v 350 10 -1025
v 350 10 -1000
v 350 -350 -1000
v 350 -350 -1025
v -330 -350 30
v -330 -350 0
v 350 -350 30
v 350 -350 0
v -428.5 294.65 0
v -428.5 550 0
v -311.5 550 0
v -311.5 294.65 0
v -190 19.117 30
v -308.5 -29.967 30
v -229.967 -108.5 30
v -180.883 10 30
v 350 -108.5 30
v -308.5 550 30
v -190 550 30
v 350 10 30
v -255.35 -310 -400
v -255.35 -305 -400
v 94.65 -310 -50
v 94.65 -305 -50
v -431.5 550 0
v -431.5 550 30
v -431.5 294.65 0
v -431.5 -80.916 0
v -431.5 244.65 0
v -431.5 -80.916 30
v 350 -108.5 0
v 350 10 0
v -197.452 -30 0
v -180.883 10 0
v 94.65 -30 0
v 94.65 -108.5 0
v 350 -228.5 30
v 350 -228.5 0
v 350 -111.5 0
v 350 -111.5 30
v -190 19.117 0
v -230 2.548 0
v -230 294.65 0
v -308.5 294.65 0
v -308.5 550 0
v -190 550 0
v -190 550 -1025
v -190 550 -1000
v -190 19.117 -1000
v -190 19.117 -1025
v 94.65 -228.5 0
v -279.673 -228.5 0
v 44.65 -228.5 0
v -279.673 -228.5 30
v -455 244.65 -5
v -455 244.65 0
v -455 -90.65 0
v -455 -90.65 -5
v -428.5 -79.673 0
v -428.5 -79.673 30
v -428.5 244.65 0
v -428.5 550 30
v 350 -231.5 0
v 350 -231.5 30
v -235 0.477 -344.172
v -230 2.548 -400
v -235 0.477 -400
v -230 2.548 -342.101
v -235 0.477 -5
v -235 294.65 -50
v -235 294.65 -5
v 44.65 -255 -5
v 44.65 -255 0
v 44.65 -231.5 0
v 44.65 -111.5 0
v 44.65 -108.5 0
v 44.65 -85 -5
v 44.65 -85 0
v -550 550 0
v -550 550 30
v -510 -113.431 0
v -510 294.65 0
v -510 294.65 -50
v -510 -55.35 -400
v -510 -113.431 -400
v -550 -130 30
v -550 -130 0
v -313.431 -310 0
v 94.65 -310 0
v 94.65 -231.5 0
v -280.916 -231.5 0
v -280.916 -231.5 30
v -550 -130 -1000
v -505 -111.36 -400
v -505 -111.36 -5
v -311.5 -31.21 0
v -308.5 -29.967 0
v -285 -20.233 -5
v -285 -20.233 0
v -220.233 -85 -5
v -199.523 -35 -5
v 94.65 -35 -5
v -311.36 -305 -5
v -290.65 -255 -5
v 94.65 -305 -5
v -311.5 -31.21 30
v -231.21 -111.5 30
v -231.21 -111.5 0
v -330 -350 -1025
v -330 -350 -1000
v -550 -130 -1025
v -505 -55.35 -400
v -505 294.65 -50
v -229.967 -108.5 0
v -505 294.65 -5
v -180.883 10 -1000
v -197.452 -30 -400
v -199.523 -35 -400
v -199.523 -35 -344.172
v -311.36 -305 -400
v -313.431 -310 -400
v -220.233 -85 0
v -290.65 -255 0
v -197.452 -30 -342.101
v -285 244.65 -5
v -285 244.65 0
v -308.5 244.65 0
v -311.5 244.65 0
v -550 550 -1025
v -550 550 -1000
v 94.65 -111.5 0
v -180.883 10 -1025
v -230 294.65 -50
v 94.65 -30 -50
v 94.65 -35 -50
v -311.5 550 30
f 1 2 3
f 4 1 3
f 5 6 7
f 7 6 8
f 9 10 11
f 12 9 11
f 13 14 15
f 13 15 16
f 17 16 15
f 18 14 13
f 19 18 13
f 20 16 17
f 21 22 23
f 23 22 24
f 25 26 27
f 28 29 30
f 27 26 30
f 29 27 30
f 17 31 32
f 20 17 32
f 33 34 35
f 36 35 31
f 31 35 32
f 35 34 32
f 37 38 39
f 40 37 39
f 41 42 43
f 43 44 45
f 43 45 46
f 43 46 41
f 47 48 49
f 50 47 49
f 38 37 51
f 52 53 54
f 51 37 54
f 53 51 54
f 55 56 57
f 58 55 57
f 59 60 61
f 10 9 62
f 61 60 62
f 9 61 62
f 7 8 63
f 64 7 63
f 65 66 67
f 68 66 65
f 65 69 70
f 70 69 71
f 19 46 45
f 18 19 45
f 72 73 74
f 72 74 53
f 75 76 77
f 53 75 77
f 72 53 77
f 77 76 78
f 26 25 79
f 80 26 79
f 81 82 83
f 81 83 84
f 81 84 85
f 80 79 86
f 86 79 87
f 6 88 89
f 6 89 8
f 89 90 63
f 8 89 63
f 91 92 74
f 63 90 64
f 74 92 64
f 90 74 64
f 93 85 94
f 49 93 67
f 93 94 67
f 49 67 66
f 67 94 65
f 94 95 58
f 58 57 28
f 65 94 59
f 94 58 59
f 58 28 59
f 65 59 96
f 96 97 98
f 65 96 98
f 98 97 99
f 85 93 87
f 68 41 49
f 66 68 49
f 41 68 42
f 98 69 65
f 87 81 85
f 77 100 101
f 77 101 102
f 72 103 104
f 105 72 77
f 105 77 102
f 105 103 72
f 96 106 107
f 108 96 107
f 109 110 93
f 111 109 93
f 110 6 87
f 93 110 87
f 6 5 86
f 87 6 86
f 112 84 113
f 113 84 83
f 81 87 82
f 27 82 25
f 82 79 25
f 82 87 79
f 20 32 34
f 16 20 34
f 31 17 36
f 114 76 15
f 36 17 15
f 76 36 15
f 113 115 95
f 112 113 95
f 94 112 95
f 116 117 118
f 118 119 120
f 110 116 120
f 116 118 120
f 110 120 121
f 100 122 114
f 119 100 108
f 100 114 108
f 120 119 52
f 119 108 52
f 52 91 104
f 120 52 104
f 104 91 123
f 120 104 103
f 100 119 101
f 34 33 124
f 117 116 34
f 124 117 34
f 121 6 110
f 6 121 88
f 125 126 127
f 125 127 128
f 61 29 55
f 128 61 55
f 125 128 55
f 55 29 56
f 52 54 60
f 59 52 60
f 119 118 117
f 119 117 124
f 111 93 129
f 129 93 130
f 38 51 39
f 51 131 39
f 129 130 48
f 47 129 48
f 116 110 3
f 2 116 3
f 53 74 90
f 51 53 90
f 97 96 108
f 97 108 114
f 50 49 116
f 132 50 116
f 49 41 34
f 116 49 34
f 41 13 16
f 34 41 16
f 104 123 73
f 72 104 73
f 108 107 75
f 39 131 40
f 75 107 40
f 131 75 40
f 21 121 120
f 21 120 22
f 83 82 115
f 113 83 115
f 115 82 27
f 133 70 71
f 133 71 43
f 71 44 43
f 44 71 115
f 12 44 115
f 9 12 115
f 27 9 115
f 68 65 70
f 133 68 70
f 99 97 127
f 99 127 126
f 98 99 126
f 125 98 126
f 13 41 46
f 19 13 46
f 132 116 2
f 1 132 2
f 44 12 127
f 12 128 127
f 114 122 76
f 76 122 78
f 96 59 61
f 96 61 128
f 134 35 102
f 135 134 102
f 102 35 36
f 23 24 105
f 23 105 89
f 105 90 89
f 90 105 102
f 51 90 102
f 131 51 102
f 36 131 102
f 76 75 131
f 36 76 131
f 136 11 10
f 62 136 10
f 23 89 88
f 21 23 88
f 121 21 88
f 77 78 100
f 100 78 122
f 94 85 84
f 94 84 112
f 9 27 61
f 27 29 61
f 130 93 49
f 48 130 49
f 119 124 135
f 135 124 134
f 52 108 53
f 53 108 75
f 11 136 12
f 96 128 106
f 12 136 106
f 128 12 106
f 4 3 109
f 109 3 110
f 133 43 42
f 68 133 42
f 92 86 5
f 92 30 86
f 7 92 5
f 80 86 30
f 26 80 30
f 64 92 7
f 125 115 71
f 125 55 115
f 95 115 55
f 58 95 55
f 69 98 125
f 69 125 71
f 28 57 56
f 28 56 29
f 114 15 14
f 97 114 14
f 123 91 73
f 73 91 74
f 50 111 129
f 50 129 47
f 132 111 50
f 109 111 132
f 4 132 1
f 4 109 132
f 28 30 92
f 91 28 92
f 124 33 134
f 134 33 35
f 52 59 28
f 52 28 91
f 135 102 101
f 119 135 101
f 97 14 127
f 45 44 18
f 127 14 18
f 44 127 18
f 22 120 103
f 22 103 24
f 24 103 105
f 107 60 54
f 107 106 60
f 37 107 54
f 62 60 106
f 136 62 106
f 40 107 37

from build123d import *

# Parameters (mm, degrees)
F1_DEPTH     = 30
F3_DEPTH     = 1000
F5_DEPTH     = 25
F6_W         = 5
F6_H         = 408.0812203564
F7_DEPTH     = 400
F8_T4_DEPTH  = 1805.1780915761
F8_T10_DEPTH = 1805.1780915761
F8_T16_DEPTH = 1805.1780915761
F8_T22_DEPTH = 1805.1780915761
F8_T28_DEPTH = 1805.1780915761
F8_T34_DEPTH = 1805.1780915761
F8_T40_DEPTH = 1805.1780915761
F8_T46_DEPTH = 1805.1780915761
F8_T52_DEPTH = 1805.1780915761
F8_T58_DEPTH = 1805.1780915761
F8_T64_DEPTH = 1805.1780915761
F8_T70_DEPTH = 1805.1780915761
F12_DEPTH    = 30
F13_DEPTH    = 5


# Not quite as in the source:
# - a fillet or chamfer that OpenCascade refuses, or shapes differently, is made with other operations: its cross-section is extruded or revolved along the edge and cut away or added


with BuildPart() as f1:
    # F0 (on Top) → F1 (new body)
    with BuildSketch(Plane.XY):
        Polygon((-190, 550), (-550, 550), (-550, -130), (-330, -350), (350, -350), (350, 10), (-180.8831175457, 10), (-190, 19.1168824543), align=None)
    extrude(amount=F1_DEPTH)

    # F2 (on face) → F3 (join)
    with BuildSketch(Plane(origin=(0, 0, 0), x_dir=(1, 0, 0), z_dir=(0, 0, -1))):
        Polygon((-330, 350), (-550, 130), (-190, -19.1168824543), (-180.8831175457, -10), align=None)
    extrude(amount=F3_DEPTH)

    # F4 (on face) → F5 (join)
    with BuildSketch(Plane(origin=(0, 0, -1000), x_dir=(1, 0, 0), z_dir=(0, 0, -1))):
        Polygon((350, 350), (-330, 350), (-550, 130), (-550, -550), (-190, -550), (-190, -19.1168824543), (-180.8831175457, -10), (350, -10), align=None)
    extrude(amount=F5_DEPTH)

    # F6 (on face) → F7 (join)
    with BuildSketch(Plane(origin=(0, 0, 0), x_dir=(1, 0, 0), z_dir=(0, 0, -1))):
        Polygon((-311.3603896932, 305), (94.6497628513, 305), (94.6497628513, 310), (-313.4314575051, 310), align=None)
        with Locations((-507.5, -90.6091526731)):
            Rectangle(F6_W, F6_H)
        Polygon((94.6497628513, 30), (94.6497628513, 35), (-199.5227278525, 35), (-197.4516600406, 30), align=None)
        Polygon((-235, -0.4772721475), (-235, -294.6497628513), (-230, -294.6497628513), (-230, -2.5483399594), align=None)
    extrude(amount=F7_DEPTH)

    # F8: chamfer of 350 on 4 edges, made by hand


with BuildPart() as f8_tool2:
    # F8_s3 → F8_t4 (new body)
    with BuildSketch(Plane.YZ.offset(-1410.0890457881)):
        Polygon((-55.3502371487, -400), (294.6497628513, -50), (294.6497628513, -400), align=None)
    extrude(amount=F8_T4_DEPTH)

    split(bisect_by=Plane(origin=(-34.5836943966, 83.4924240492, 0), x_dir=(0, 0, 1), z_dir=(-0.3826834324, 0.9238795325, 0)), keep=Keep.TOP)

    split(bisect_by=Plane(origin=(-157.9289321881, 65.4163056034, 0), x_dir=(0, 0, 1), z_dir=(-0.9238795325, 0.3826834324, 0)), keep=Keep.TOP)


with BuildPart() as f1_1:
    add(f1.part)

    # F8_t1: cut F8_tool2
    add(f8_tool2.part, mode=Mode.SUBTRACT)


with BuildPart() as f8_tool8:
    # F8_s9 → F8_t10 (new body)
    with BuildSketch(Plane.YZ.offset(-1410.0890457881)):
        Polygon((-55.3502371487, -400), (294.6497628513, -50), (294.6497628513, -400), align=None)
    extrude(amount=F8_T10_DEPTH)

    split(bisect_by=Plane(origin=(-34.5836943966, 83.4924240492, 0), x_dir=(0, 0, 1), z_dir=(-0.3826834324, 0.9238795325, 0)), keep=Keep.TOP)

    split(bisect_by=Plane(origin=(-157.9289321881, 65.4163056034, 0), x_dir=(0, 0, 1), z_dir=(0.9238795325, -0.3826834324, 0)), keep=Keep.TOP)


with BuildPart() as f1_2:
    add(f1_1.part)

    # F8_t7: cut F8_tool8
    add(f8_tool8.part, mode=Mode.SUBTRACT)


with BuildPart() as f8_tool14:
    # F8_s15 → F8_t16 (new body)
    with BuildSketch(Plane.YZ.offset(-1410.0890457881)):
        Polygon((-55.3502371487, -400), (294.6497628513, -50), (294.6497628513, -400), align=None)
    extrude(amount=F8_T16_DEPTH)

    split(bisect_by=Plane(origin=(-34.5836943966, 83.4924240492, 0), x_dir=(0, 0, 1), z_dir=(0.3826834324, -0.9238795325, 0)), keep=Keep.TOP)

    split(bisect_by=Plane(origin=(-157.9289321881, 65.4163056034, 0), x_dir=(0, 0, 1), z_dir=(0.9238795325, -0.3826834324, 0)), keep=Keep.TOP)


with BuildPart() as f1_3:
    add(f1_2.part)

    # F8_t13: cut F8_tool14
    add(f8_tool14.part, mode=Mode.SUBTRACT)


with BuildPart() as f8_tool20:
    # F8_s21 → F8_t22 (new body)
    with BuildSketch(Plane.XZ.offset(-595.0890457881)):
        Polygon((-255.3502371487, -400), (94.6497628513, -50), (94.6497628513, -400), align=None)
    extrude(amount=F8_T22_DEPTH)

    split(bisect_by=Plane(origin=(-34.5836943966, 83.4924240492, 0), x_dir=(0, 0, 1), z_dir=(-0.3826834324, 0.9238795325, 0)), keep=Keep.TOP)

    split(bisect_by=Plane(origin=(-157.9289321881, 65.4163056034, 0), x_dir=(0, 0, 1), z_dir=(-0.9238795325, 0.3826834324, 0)), keep=Keep.TOP)


with BuildPart() as f1_4:
    add(f1_3.part)

    # F8_t19: cut F8_tool20
    add(f8_tool20.part, mode=Mode.SUBTRACT)


with BuildPart() as f8_tool26:
    # F8_s27 → F8_t28 (new body)
    with BuildSketch(Plane.XZ.offset(-595.0890457881)):
        Polygon((-255.3502371487, -400), (94.6497628513, -50), (94.6497628513, -400), align=None)
    extrude(amount=F8_T28_DEPTH)

    split(bisect_by=Plane(origin=(-34.5836943966, 83.4924240492, 0), x_dir=(0, 0, 1), z_dir=(-0.3826834324, 0.9238795325, 0)), keep=Keep.TOP)

    split(bisect_by=Plane(origin=(-157.9289321881, 65.4163056034, 0), x_dir=(0, 0, 1), z_dir=(0.9238795325, -0.3826834324, 0)), keep=Keep.TOP)


with BuildPart() as f1_5:
    add(f1_4.part)

    # F8_t25: cut F8_tool26
    add(f8_tool26.part, mode=Mode.SUBTRACT)


with BuildPart() as f8_tool32:
    # F8_s33 → F8_t34 (new body)
    with BuildSketch(Plane.XZ.offset(-595.0890457881)):
        Polygon((-255.3502371487, -400), (94.6497628513, -50), (94.6497628513, -400), align=None)
    extrude(amount=F8_T34_DEPTH)

    split(bisect_by=Plane(origin=(-34.5836943966, 83.4924240492, 0), x_dir=(0, 0, 1), z_dir=(0.3826834324, -0.9238795325, 0)), keep=Keep.TOP)

    split(bisect_by=Plane(origin=(-157.9289321881, 65.4163056034, 0), x_dir=(0, 0, 1), z_dir=(0.9238795325, -0.3826834324, 0)), keep=Keep.TOP)


with BuildPart() as f1_6:
    add(f1_5.part)

    # F8_t31: cut F8_tool32
    add(f8_tool32.part, mode=Mode.SUBTRACT)


with BuildPart() as f8_tool38:
    # F8_s39 → F8_t40 (new body)
    with BuildSketch(Plane.YZ.offset(-1135.0890457881)):
        Polygon((-55.3502371487, -400), (294.6497628513, -50), (294.6497628513, -400), align=None)
    extrude(amount=F8_T40_DEPTH)

    split(bisect_by=Plane(origin=(-34.5836943966, 83.4924240492, 0), x_dir=(0, 0, 1), z_dir=(-0.3826834324, 0.9238795325, 0)), keep=Keep.TOP)

    split(bisect_by=Plane(origin=(-157.9289321881, 65.4163056034, 0), x_dir=(0, 0, 1), z_dir=(-0.9238795325, 0.3826834324, 0)), keep=Keep.TOP)


with BuildPart() as f1_7:
    add(f1_6.part)

    # F8_t37: cut F8_tool38
    add(f8_tool38.part, mode=Mode.SUBTRACT)


with BuildPart() as f8_tool44:
    # F8_s45 → F8_t46 (new body)
    with BuildSketch(Plane.YZ.offset(-1135.0890457881)):
        Polygon((-55.3502371487, -400), (294.6497628513, -50), (294.6497628513, -400), align=None)
    extrude(amount=F8_T46_DEPTH)

    split(bisect_by=Plane(origin=(-34.5836943966, 83.4924240492, 0), x_dir=(0, 0, 1), z_dir=(-0.3826834324, 0.9238795325, 0)), keep=Keep.TOP)

    split(bisect_by=Plane(origin=(-157.9289321881, 65.4163056034, 0), x_dir=(0, 0, 1), z_dir=(0.9238795325, -0.3826834324, 0)), keep=Keep.TOP)


with BuildPart() as f1_8:
    add(f1_7.part)

    # F8_t43: cut F8_tool44
    add(f8_tool44.part, mode=Mode.SUBTRACT)


with BuildPart() as f8_tool50:
    # F8_s51 → F8_t52 (new body)
    with BuildSketch(Plane.YZ.offset(-1135.0890457881)):
        Polygon((-55.3502371487, -400), (294.6497628513, -50), (294.6497628513, -400), align=None)
    extrude(amount=F8_T52_DEPTH)

    split(bisect_by=Plane(origin=(-34.5836943966, 83.4924240492, 0), x_dir=(0, 0, 1), z_dir=(0.3826834324, -0.9238795325, 0)), keep=Keep.TOP)

    split(bisect_by=Plane(origin=(-157.9289321881, 65.4163056034, 0), x_dir=(0, 0, 1), z_dir=(0.9238795325, -0.3826834324, 0)), keep=Keep.TOP)


with BuildPart() as f1_9:
    add(f1_8.part)

    # F8_t49: cut F8_tool50
    add(f8_tool50.part, mode=Mode.SUBTRACT)


with BuildPart() as f8_tool56:
    # F8_s57 → F8_t58 (new body)
    with BuildSketch(Plane.XZ.offset(-870.0890457881)):
        Polygon((-255.3502371487, -400), (94.6497628513, -50), (94.6497628513, -400), align=None)
    extrude(amount=F8_T58_DEPTH)

    split(bisect_by=Plane(origin=(-34.5836943966, 83.4924240492, 0), x_dir=(0, 0, 1), z_dir=(-0.3826834324, 0.9238795325, 0)), keep=Keep.TOP)

    split(bisect_by=Plane(origin=(-157.9289321881, 65.4163056034, 0), x_dir=(0, 0, 1), z_dir=(-0.9238795325, 0.3826834324, 0)), keep=Keep.TOP)


with BuildPart() as f1_10:
    add(f1_9.part)

    # F8_t55: cut F8_tool56
    add(f8_tool56.part, mode=Mode.SUBTRACT)


with BuildPart() as f8_tool62:
    # F8_s63 → F8_t64 (new body)
    with BuildSketch(Plane.XZ.offset(-870.0890457881)):
        Polygon((-255.3502371487, -400), (94.6497628513, -50), (94.6497628513, -400), align=None)
    extrude(amount=F8_T64_DEPTH)

    split(bisect_by=Plane(origin=(-34.5836943966, 83.4924240492, 0), x_dir=(0, 0, 1), z_dir=(-0.3826834324, 0.9238795325, 0)), keep=Keep.TOP)

    split(bisect_by=Plane(origin=(-157.9289321881, 65.4163056034, 0), x_dir=(0, 0, 1), z_dir=(0.9238795325, -0.3826834324, 0)), keep=Keep.TOP)


with BuildPart() as f1_11:
    add(f1_10.part)

    # F8_t61: cut F8_tool62
    add(f8_tool62.part, mode=Mode.SUBTRACT)


with BuildPart() as f8_tool68:
    # F8_s69 → F8_t70 (new body)
    with BuildSketch(Plane.XZ.offset(-870.0890457881)):
        Polygon((-255.3502371487, -400), (94.6497628513, -50), (94.6497628513, -400), align=None)
    extrude(amount=F8_T70_DEPTH)

    split(bisect_by=Plane(origin=(-34.5836943966, 83.4924240492, 0), x_dir=(0, 0, 1), z_dir=(0.3826834324, -0.9238795325, 0)), keep=Keep.TOP)

    split(bisect_by=Plane(origin=(-157.9289321881, 65.4163056034, 0), x_dir=(0, 0, 1), z_dir=(0.9238795325, -0.3826834324, 0)), keep=Keep.TOP)


with BuildPart() as f1_12:
    add(f1_11.part)

    # F8_t67: cut F8_tool68
    add(f8_tool68.part, mode=Mode.SUBTRACT)

    # F11 (on face) → F12 (cut, through all)
    with BuildSketch(Plane.XY.offset(30)):
        Polygon((-431.5, -80.9156928588), (-280.9156928588, -231.5), (350, -231.5), (350, -228.5), (-279.6730521717, -228.5), (-428.5, -79.6730521717), (-428.5, 550), (-431.5, 550), align=None)
        Polygon((-311.5, -31.210065374), (-231.210065374, -111.5), (350, -111.5), (350, -108.5), (-229.9674246869, -108.5), (-308.5, -29.9674246869), (-308.5, 550), (-311.5, 550), align=None)
    extrude(amount=-F12_DEPTH, mode=Mode.SUBTRACT)

    # F9 (on face) → F13 (join)
    with BuildSketch(Plane(origin=(0, 0, 0), x_dir=(1, 0, 0), z_dir=(0, 0, -1))):
        Polygon((94.6497628513, 255), (94.6497628513, 305), (-311.3603896932, 305), (-290.6497115746, 255), (44.6497628513, 255), (44.6497628513, 85), (-220.2334059711, 85), (-199.5227278525, 35), (94.6497628513, 35), (94.6497628513, 85), align=None)
        Polygon((-285, -294.6497628513), (-235, -294.6497628513), (-235, -0.4772721475), (-285, 20.2334059711), (-285, -244.6497628513), (-455, -244.6497628513), (-455, 90.6497115746), (-505, 111.3603896932), (-505, -294.6497628513), (-455, -294.6497628513), align=None)
    extrude(amount=F13_DEPTH)


solid = f1_12.part
